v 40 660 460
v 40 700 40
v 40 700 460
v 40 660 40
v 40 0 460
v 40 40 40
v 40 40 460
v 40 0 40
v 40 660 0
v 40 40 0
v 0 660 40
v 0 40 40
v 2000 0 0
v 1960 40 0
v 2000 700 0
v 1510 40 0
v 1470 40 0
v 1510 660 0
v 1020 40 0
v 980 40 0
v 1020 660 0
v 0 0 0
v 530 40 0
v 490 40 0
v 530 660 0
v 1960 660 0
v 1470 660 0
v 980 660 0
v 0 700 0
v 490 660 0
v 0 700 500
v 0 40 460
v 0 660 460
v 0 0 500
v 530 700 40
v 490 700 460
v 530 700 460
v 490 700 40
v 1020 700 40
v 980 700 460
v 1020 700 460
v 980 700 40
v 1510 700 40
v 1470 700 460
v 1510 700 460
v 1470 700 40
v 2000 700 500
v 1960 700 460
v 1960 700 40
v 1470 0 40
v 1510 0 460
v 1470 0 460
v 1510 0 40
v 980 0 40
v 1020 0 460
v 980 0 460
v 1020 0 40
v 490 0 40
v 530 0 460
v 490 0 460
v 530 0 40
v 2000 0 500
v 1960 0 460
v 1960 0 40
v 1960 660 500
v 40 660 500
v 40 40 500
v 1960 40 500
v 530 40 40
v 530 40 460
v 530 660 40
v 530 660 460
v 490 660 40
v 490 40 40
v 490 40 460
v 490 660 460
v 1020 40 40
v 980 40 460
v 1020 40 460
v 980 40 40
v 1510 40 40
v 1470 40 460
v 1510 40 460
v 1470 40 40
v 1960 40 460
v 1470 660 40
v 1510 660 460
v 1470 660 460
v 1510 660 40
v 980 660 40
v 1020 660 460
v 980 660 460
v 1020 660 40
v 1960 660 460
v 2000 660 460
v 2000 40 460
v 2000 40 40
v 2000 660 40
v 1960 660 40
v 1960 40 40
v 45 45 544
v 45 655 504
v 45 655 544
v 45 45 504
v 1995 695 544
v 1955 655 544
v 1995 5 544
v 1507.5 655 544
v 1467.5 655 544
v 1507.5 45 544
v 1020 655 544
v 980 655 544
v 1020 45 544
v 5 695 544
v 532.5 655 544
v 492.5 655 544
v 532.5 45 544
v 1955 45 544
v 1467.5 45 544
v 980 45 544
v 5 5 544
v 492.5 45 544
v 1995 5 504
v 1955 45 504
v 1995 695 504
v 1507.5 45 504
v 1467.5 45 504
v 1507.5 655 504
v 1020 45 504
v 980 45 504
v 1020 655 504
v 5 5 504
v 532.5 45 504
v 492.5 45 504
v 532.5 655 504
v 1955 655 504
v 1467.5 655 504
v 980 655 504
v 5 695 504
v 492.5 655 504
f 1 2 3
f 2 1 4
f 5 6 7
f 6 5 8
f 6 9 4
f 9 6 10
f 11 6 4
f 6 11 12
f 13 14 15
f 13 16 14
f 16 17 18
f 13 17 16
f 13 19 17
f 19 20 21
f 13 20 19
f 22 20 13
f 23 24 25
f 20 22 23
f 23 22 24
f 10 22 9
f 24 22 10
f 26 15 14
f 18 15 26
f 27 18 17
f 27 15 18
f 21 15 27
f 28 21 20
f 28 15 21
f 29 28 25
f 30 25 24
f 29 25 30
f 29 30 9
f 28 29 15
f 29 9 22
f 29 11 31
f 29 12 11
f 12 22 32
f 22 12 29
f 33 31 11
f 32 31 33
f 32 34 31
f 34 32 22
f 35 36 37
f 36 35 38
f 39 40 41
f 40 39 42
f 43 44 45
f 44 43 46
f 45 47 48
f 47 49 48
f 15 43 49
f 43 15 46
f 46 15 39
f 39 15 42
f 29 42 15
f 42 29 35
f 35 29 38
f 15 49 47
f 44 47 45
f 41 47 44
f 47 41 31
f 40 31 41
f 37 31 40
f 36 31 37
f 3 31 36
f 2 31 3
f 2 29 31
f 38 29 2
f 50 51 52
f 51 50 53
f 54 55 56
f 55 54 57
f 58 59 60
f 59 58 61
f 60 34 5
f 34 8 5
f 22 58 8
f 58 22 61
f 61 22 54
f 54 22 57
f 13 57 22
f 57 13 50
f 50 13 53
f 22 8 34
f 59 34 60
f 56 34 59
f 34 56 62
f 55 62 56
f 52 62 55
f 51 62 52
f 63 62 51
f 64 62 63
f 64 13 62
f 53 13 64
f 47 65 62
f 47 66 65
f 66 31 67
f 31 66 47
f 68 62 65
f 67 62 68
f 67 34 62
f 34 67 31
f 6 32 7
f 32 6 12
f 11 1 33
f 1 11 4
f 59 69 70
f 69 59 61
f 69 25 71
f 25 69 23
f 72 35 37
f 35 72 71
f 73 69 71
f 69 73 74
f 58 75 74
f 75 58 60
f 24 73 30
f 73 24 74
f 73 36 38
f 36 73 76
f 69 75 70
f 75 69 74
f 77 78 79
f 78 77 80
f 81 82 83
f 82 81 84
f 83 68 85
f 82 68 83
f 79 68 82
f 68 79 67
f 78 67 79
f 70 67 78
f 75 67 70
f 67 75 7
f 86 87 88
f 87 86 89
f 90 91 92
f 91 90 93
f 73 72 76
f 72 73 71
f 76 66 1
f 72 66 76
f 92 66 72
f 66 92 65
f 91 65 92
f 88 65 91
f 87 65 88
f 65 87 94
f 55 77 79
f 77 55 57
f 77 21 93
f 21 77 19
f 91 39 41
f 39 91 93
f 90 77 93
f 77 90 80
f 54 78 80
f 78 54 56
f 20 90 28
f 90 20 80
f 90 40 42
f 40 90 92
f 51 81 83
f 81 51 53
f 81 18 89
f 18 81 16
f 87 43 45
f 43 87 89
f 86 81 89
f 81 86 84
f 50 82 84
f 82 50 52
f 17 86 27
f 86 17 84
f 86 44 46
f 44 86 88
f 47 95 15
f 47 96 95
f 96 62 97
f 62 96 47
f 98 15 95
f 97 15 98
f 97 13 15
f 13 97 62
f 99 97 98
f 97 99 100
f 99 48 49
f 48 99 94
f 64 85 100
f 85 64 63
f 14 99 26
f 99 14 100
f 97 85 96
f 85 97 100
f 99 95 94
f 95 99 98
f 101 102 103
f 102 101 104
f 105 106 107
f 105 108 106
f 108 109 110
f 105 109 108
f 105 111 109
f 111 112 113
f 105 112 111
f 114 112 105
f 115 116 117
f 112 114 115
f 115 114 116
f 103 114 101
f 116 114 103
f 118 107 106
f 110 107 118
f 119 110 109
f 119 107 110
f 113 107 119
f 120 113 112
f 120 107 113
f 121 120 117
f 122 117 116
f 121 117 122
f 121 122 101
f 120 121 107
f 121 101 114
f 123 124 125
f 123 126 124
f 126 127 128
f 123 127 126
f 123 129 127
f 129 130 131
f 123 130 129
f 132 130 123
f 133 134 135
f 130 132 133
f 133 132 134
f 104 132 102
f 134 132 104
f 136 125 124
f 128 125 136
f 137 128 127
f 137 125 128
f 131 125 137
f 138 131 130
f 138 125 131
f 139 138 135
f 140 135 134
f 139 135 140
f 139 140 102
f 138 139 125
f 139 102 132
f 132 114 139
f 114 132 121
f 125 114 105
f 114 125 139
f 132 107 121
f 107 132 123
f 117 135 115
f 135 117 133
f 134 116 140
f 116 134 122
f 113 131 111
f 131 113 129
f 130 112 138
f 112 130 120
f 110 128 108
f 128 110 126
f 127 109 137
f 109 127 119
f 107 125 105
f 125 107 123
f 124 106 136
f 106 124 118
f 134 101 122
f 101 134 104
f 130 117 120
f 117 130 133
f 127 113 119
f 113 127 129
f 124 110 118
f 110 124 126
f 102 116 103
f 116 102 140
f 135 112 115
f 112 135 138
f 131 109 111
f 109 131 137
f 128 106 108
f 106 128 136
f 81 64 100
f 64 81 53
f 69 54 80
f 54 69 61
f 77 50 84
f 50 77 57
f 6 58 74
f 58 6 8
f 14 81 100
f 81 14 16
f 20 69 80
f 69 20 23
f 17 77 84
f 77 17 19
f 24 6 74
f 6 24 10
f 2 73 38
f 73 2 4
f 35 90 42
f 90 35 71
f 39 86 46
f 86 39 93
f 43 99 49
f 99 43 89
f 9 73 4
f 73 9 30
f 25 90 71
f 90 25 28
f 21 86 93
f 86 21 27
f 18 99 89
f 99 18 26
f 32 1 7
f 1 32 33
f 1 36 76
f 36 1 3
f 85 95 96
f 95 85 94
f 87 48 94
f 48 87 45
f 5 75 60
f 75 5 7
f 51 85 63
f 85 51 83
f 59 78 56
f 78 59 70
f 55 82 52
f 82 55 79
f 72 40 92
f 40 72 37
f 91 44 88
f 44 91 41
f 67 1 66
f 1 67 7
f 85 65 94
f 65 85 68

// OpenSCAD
/*
Suppliers:
- https://mymetal.ch/fr/53-profil-equerre-a-aile-egale-aluminium.html

*/

radius=40;
thickness=4;
topSpacing=4;
topGap=5; // space on the side of the top

width = 2000;
depth = 700;
height = 500;

opacity=0;

translate([0,0,0]) cube( [width,radius, radius]);
translate([0,depth-radius,0]) cube( [width,radius, radius]);
for (i=[0:(width-radius)/4:width-radius]) {
  translate([i,0,0]) cube([radius, depth, radius]);
  translate([i,0,0]) cube([radius, radius, height]);
  translate([i,depth-radius,0]) cube([radius, radius, height]);
}

translate([0,0,height-radius]) cube( [width,radius, radius]);
translate([0,depth-radius,height-radius]) cube( [width,radius, radius]);
translate([0,0,height-radius]) cube([radius, depth, radius]);
translate([width-radius,0,height-radius]) cube([radius, depth, radius]);

if (opacity>0) {
  translate([0,-thickness,0]) color("grey", opacity) cube([width, thickness, height+radius+topGap]);
  translate([0,depth,0]) color("grey", opacity) cube([width, thickness, height+radius]);
  translate([-thickness,0,0]) color("grey", opacity) cube([thickness, depth, height+radius+topGap]);
  translate([width,0,0]) color("grey", opacity) cube([thickness, depth, height+radius+topGap]);
}

// top
color("blue") translate([topGap,topGap,height+topSpacing]) {
  translate([0,0,0]) cube( [width-2*topGap,radius, radius]);
  translate([0,depth-radius-2*topGap,0]) cube( [width-2*topGap,radius, radius]);
  for (i=[0:(width-radius-2*topGap)/4:width-radius-2*topGap]) {
    translate([i,0,0]) cube([radius, depth-2*topGap, radius]);
  }
}
if (opacity>0) {
  translate([-thickness,-thickness,height+topGap+radius]) color("blue", opacity) cube([width+2*thickness, depth+2*thickness, thickness]);
}
